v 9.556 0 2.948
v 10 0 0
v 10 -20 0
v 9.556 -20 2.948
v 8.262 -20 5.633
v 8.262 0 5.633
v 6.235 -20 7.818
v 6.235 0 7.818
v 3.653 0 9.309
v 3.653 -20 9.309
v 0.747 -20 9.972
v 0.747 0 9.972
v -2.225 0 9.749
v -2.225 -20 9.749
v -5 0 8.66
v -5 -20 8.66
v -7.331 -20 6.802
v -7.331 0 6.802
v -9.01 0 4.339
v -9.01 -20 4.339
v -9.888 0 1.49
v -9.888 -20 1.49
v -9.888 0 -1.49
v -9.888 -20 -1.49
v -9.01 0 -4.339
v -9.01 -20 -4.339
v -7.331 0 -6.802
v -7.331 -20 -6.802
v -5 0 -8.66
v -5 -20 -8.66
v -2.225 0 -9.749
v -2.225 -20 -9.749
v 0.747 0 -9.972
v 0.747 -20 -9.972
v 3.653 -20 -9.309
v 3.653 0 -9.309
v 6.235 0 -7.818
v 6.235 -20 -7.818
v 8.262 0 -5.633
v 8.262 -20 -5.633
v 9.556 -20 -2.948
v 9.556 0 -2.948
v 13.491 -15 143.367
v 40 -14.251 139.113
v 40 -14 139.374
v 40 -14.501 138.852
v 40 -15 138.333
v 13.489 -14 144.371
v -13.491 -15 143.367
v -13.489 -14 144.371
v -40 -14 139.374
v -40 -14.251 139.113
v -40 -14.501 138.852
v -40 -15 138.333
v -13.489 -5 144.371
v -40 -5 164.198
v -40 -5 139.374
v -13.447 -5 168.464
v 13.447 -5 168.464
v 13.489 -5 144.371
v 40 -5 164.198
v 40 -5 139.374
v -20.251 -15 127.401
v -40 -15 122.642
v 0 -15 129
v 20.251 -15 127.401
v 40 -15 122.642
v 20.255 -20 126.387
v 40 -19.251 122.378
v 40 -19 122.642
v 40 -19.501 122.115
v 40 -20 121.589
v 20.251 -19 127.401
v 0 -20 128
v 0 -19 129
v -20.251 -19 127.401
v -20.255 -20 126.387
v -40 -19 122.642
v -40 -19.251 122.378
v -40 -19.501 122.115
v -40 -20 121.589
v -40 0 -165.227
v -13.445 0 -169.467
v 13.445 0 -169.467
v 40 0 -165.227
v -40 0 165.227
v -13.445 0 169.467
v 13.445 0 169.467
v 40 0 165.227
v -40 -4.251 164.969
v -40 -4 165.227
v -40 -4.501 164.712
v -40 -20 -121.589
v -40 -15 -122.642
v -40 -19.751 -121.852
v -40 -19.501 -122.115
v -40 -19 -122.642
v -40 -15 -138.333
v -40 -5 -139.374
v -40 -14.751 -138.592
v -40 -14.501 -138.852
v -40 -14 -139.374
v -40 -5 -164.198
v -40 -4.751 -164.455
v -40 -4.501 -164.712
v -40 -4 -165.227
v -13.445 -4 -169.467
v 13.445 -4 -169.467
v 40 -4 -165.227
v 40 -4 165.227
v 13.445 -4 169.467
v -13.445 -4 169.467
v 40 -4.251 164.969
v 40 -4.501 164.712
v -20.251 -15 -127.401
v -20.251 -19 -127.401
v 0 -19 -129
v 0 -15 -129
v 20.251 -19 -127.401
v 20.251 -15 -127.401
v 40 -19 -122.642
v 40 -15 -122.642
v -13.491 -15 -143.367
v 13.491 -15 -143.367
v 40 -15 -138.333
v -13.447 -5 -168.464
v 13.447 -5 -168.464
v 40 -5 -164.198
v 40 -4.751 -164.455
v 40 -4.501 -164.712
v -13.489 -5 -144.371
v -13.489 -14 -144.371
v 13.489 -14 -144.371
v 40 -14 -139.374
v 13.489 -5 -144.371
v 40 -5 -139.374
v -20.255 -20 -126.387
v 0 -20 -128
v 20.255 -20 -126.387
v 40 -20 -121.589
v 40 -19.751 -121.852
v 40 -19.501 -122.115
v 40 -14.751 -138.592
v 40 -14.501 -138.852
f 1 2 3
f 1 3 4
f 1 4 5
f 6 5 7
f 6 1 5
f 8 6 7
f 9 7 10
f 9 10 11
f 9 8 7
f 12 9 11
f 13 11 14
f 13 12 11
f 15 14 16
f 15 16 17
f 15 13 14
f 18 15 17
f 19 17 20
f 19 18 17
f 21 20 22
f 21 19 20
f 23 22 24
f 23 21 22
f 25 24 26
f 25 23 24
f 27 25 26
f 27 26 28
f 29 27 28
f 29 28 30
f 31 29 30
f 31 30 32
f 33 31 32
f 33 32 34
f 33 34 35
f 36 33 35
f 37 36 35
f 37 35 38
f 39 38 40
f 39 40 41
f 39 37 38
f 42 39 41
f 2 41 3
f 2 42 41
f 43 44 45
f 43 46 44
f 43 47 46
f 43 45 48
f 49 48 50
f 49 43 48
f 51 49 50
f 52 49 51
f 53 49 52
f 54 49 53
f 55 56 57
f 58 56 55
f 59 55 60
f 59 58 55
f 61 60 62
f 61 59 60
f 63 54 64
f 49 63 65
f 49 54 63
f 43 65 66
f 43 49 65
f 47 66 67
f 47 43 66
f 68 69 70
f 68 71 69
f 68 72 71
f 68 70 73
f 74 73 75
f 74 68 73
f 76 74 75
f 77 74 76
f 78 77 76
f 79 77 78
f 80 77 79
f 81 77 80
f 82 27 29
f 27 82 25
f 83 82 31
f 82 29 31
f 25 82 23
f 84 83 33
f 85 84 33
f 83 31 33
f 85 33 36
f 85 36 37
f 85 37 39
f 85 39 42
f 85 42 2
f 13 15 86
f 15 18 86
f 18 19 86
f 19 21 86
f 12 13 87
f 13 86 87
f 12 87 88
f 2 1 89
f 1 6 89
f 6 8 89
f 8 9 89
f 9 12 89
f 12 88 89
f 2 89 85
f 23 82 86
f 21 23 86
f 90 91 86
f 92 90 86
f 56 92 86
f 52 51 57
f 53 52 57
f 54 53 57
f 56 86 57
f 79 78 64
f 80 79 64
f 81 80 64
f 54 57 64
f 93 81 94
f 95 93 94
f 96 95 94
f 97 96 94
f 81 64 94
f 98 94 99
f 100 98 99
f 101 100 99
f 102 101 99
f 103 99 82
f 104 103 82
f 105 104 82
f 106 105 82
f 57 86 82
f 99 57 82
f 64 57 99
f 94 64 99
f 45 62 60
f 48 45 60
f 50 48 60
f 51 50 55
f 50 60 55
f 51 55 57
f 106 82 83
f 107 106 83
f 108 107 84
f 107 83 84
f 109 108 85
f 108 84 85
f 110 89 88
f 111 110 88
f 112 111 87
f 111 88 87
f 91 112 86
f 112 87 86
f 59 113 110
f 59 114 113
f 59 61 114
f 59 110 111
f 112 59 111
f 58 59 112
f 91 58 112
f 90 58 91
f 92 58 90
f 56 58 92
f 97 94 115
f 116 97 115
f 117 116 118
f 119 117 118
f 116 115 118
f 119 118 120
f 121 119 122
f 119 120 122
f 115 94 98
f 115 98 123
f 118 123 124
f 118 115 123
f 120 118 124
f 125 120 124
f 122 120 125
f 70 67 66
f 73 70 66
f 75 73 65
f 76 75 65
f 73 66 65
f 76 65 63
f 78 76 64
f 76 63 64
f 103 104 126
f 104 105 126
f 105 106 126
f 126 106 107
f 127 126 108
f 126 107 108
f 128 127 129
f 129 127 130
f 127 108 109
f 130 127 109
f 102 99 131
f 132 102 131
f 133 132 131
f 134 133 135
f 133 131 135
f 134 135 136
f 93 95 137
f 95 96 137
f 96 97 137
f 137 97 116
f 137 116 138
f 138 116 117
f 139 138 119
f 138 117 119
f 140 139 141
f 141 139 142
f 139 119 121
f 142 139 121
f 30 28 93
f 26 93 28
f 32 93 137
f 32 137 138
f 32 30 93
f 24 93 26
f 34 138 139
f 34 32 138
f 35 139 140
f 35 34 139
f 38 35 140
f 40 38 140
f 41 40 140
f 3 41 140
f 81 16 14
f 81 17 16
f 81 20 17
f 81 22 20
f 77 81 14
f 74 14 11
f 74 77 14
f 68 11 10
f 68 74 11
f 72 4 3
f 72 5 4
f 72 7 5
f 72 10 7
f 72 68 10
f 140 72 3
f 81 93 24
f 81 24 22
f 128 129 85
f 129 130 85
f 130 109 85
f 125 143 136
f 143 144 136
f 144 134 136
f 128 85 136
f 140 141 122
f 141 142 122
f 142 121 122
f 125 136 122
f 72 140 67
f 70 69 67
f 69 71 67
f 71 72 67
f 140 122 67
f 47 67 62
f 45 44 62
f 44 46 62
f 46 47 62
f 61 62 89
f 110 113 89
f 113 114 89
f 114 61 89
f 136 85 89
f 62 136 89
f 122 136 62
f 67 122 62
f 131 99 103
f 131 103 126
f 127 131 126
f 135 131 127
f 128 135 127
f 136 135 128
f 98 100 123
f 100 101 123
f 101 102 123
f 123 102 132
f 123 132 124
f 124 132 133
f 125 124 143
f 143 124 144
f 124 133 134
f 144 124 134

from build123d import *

# Parameters (mm, degrees)
F1_DEPTH = 5
F2_DEPTH = 15
F0_R     = 10
F3_DEPTH = 20
F4_DEPTH = 30
F5_SIZE  = 1


with BuildPart() as f1:
    # F0 (on Front) → F1 (new body)
    with BuildSketch(Plane.XZ):
        with BuildLine():
            Line((40, 139.3735986477), (40, 165.2271164186))
            ThreePointArc((40, 165.2271164186), (0, 170), (-40, 165.2271164186))
            Line((-40, 165.2271164186), (-40, 139.3735986477))
            ThreePointArc((-40, 139.3735986477), (0, 145), (40, 139.3735986477))
        make_face()
        with BuildLine():
            Line((-40, 139.3735986477), (-40, 165.2271164186))
            ThreePointArc((-40, 165.2271164186), (-170, 0), (-40, -165.2271164186))
            Line((-40, -165.2271164186), (-40, -139.3735986477))
            ThreePointArc((-40, -139.3735986477), (-145, 0), (-40, 139.3735986477))
        make_face()
        with BuildLine():
            ThreePointArc((-40, -165.2271164186), (0, -170), (40, -165.2271164186))
            Line((40, -165.2271164186), (40, -139.3735986477))
            ThreePointArc((40, -139.3735986477), (0, -145), (-40, -139.3735986477))
            Line((-40, -139.3735986477), (-40, -165.2271164186))
        make_face()
        with BuildLine():
            ThreePointArc((40, -165.2271164186), (133.6038921589, -105.1189802081), (170, 0))
            ThreePointArc((170, 0), (133.6038921589, 105.1189802081), (40, 165.2271164186))
            Line((40, 165.2271164186), (40, 139.3735986477))
            ThreePointArc((40, 139.3735986477), (115.812348219, 87.2496418331), (145, 0))
            ThreePointArc((145, 0), (115.812348219, -87.2496418331), (40, -139.3735986477))
            Line((40, -139.3735986477), (40, -165.2271164186))
        make_face()
    extrude(amount=F1_DEPTH)

    # F0 (on Front) → F2 (join)
    with BuildSketch(Plane.XZ):
        with BuildLine():
            Line((40, 122.6417547167), (40, 139.3735986477))
            ThreePointArc((40, 139.3735986477), (0, 145), (-40, 139.3735986477))
            Line((-40, 139.3735986477), (-40, 122.6417547167))
            ThreePointArc((-40, 122.6417547167), (0, 129), (40, 122.6417547167))
        make_face()
        with BuildLine():
            Line((-40, 122.6417547167), (-40, 139.3735986477))
            ThreePointArc((-40, 139.3735986477), (-145, 0), (-40, -139.3735986477))
            Line((-40, -139.3735986477), (-40, -122.6417547167))
            ThreePointArc((-40, -122.6417547167), (-129, 0), (-40, 122.6417547167))
        make_face()
        with BuildLine():
            ThreePointArc((-40, -139.3735986477), (0, -145), (40, -139.3735986477))
            Line((40, -139.3735986477), (40, -122.6417547167))
            ThreePointArc((40, -122.6417547167), (0, -129), (-40, -122.6417547167))
            Line((-40, -122.6417547167), (-40, -139.3735986477))
        make_face()
        with BuildLine():
            ThreePointArc((145, 0), (115.812348219, 87.2496418331), (40, 139.3735986477))
            Line((40, 139.3735986477), (40, 122.6417547167))
            ThreePointArc((40, 122.6417547167), (104.4054596274, 75.7660874006), (129, 0))
            ThreePointArc((129, 0), (104.4054596274, -75.7660874006), (40, -122.6417547167))
            Line((40, -122.6417547167), (40, -139.3735986477))
            ThreePointArc((40, -139.3735986477), (115.812348219, -87.2496418331), (145, 0))
        make_face()
    extrude(amount=F2_DEPTH)

    # F0 (on Front) → F3 (join)
    with BuildSketch(Plane.XZ):
        with BuildLine():
            Line((40, -122.6417547167), (40, 122.6417547167))
            ThreePointArc((40, 122.6417547167), (0, 129), (-40, 122.6417547167))
            Line((-40, 122.6417547167), (-40, -122.6417547167))
            ThreePointArc((-40, -122.6417547167), (0, -129), (40, -122.6417547167))
        make_face()
        Circle(F0_R, mode=Mode.SUBTRACT)
    extrude(amount=F3_DEPTH)

    # F0 (on Front) → F4 (cut)
    with BuildSketch(Plane.XZ):
        with BuildLine():
            ThreePointArc((40, -165.2271164186), (133.6038921589, -105.1189802081), (170, 0))
            ThreePointArc((170, 0), (133.6038921589, 105.1189802081), (40, 165.2271164186))
            Line((40, 165.2271164186), (40, 139.3735986477))
            ThreePointArc((40, 139.3735986477), (115.812348219, 87.2496418331), (145, 0))
            ThreePointArc((145, 0), (115.812348219, -87.2496418331), (40, -139.3735986477))
            Line((40, -139.3735986477), (40, -165.2271164186))
        make_face()
        with BuildLine():
            Line((-40, 139.3735986477), (-40, 165.2271164186))
            ThreePointArc((-40, 165.2271164186), (-170, 0), (-40, -165.2271164186))
            Line((-40, -165.2271164186), (-40, -139.3735986477))
            ThreePointArc((-40, -139.3735986477), (-145, 0), (-40, 139.3735986477))
        make_face()
        with BuildLine():
            ThreePointArc((145, 0), (115.812348219, 87.2496418331), (40, 139.3735986477))
            Line((40, 139.3735986477), (40, 122.6417547167))
            ThreePointArc((40, 122.6417547167), (104.4054596274, 75.7660874006), (129, 0))
            ThreePointArc((129, 0), (104.4054596274, -75.7660874006), (40, -122.6417547167))
            Line((40, -122.6417547167), (40, -139.3735986477))
            ThreePointArc((40, -139.3735986477), (115.812348219, -87.2496418331), (145, 0))
        make_face()
        with BuildLine():
            Line((-40, 122.6417547167), (-40, 139.3735986477))
            ThreePointArc((-40, 139.3735986477), (-145, 0), (-40, -139.3735986477))
            Line((-40, -139.3735986477), (-40, -122.6417547167))
            ThreePointArc((-40, -122.6417547167), (-129, 0), (-40, 122.6417547167))
        make_face()
        with BuildLine():
            ThreePointArc((129, 0), (104.4054596274, 75.7660874006), (40, 122.6417547167))
            Line((40, 122.6417547167), (40, -122.6417547167))
            ThreePointArc((40, -122.6417547167), (104.4054596274, -75.7660874006), (129, 0))
        make_face()
    extrude(amount=F4_DEPTH, mode=Mode.SUBTRACT)

    # F5
    f5_edges = [f1.edges().sort_by_distance(p)[0] for p in [
        (0, -20, -129),
        (0, -15, -145),
        (0, -15, 145),
        (0, -5, 170),
        (0, -5, -170),
        (0, -20, 129),
    ]]
    chamfer(f5_edges, length=F5_SIZE)


solid = f1.part
